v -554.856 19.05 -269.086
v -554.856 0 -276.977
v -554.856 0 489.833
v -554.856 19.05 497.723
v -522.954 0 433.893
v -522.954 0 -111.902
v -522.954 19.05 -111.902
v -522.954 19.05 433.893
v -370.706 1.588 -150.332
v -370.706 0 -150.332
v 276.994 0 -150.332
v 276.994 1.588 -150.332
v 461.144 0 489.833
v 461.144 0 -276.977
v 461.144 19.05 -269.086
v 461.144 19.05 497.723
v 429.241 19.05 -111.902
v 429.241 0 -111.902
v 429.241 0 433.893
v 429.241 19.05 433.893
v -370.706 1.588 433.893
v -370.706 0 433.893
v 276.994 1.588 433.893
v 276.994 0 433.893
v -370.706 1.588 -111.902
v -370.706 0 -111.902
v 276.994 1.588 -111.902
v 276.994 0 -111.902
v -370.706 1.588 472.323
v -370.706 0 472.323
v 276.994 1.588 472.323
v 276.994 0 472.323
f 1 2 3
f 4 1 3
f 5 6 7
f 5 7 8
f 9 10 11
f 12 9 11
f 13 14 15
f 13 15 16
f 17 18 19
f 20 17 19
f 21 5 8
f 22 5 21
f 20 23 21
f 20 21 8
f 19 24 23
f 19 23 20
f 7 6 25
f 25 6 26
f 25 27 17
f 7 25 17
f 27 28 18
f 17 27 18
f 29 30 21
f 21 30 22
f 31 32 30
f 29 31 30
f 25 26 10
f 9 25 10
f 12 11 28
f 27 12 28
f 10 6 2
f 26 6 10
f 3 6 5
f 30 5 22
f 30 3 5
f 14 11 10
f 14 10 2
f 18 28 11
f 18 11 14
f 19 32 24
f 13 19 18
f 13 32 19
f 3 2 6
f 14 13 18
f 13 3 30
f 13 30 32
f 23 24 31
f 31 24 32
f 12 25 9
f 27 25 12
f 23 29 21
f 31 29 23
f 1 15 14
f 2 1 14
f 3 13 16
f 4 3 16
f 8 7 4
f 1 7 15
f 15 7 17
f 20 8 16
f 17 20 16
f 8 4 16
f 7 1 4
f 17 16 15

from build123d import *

# Parameters (mm, degrees)
F0_W     = 1016
F0_H     = 774.7
F1_DEPTH = 19.05
F3_DEPTH = 1016.001
F4_W     = 952.1952
F4_H     = 545.7952
F5_DEPTH = 19.051
F7_DEPTH = 1.5875
F9_DEPTH = 1016.001


with BuildPart() as f1:
    # F0 (on Front) → F1 (new body)
    with BuildSketch(Plane.XZ):
        with Locations((-46.856156, 110.373389)):
            Rectangle(F0_W, F0_H)
    extrude(amount=-F1_DEPTH)

    # F2 (on face) → F3 (cut, through all)
    with BuildSketch(Plane.YZ.offset(461.143844)):
        Polygon((19.05, -269.085843), (0, -276.976611), (19.05, -276.976611), align=None)
    extrude(amount=-F3_DEPTH, mode=Mode.SUBTRACT)

    # F4 (on face) → F5 (cut, through all)
    with BuildSketch(Plane.XZ):
        with Locations((-46.856156, 160.995589)):
            Rectangle(F4_W, F4_H)
    extrude(amount=-F5_DEPTH, mode=Mode.SUBTRACT)

    # F6 (on face) → F7 (cut)
    with BuildSketch(Plane.XZ):
        Polygon((276.993844, 472.323389), (-46.856156, 472.323389), (-370.706156, 472.323389), (-370.706156, 433.893189), (276.993844, 433.893189), align=None)
        Polygon((276.993844, -111.902011), (-370.706156, -111.902011), (-370.706156, -150.332211), (-46.856156, -150.332211), (276.993844, -150.332211), align=None)
    extrude(amount=-F7_DEPTH, mode=Mode.SUBTRACT)

    # F8 (on face) → F9 (cut, through all)
    with BuildSketch(Plane.YZ.offset(461.143844)):
        Polygon((19.05, 497.723389), (0, 497.723389), (0, 489.832621), align=None)
    extrude(amount=-F9_DEPTH, mode=Mode.SUBTRACT)


solid = f1.part
